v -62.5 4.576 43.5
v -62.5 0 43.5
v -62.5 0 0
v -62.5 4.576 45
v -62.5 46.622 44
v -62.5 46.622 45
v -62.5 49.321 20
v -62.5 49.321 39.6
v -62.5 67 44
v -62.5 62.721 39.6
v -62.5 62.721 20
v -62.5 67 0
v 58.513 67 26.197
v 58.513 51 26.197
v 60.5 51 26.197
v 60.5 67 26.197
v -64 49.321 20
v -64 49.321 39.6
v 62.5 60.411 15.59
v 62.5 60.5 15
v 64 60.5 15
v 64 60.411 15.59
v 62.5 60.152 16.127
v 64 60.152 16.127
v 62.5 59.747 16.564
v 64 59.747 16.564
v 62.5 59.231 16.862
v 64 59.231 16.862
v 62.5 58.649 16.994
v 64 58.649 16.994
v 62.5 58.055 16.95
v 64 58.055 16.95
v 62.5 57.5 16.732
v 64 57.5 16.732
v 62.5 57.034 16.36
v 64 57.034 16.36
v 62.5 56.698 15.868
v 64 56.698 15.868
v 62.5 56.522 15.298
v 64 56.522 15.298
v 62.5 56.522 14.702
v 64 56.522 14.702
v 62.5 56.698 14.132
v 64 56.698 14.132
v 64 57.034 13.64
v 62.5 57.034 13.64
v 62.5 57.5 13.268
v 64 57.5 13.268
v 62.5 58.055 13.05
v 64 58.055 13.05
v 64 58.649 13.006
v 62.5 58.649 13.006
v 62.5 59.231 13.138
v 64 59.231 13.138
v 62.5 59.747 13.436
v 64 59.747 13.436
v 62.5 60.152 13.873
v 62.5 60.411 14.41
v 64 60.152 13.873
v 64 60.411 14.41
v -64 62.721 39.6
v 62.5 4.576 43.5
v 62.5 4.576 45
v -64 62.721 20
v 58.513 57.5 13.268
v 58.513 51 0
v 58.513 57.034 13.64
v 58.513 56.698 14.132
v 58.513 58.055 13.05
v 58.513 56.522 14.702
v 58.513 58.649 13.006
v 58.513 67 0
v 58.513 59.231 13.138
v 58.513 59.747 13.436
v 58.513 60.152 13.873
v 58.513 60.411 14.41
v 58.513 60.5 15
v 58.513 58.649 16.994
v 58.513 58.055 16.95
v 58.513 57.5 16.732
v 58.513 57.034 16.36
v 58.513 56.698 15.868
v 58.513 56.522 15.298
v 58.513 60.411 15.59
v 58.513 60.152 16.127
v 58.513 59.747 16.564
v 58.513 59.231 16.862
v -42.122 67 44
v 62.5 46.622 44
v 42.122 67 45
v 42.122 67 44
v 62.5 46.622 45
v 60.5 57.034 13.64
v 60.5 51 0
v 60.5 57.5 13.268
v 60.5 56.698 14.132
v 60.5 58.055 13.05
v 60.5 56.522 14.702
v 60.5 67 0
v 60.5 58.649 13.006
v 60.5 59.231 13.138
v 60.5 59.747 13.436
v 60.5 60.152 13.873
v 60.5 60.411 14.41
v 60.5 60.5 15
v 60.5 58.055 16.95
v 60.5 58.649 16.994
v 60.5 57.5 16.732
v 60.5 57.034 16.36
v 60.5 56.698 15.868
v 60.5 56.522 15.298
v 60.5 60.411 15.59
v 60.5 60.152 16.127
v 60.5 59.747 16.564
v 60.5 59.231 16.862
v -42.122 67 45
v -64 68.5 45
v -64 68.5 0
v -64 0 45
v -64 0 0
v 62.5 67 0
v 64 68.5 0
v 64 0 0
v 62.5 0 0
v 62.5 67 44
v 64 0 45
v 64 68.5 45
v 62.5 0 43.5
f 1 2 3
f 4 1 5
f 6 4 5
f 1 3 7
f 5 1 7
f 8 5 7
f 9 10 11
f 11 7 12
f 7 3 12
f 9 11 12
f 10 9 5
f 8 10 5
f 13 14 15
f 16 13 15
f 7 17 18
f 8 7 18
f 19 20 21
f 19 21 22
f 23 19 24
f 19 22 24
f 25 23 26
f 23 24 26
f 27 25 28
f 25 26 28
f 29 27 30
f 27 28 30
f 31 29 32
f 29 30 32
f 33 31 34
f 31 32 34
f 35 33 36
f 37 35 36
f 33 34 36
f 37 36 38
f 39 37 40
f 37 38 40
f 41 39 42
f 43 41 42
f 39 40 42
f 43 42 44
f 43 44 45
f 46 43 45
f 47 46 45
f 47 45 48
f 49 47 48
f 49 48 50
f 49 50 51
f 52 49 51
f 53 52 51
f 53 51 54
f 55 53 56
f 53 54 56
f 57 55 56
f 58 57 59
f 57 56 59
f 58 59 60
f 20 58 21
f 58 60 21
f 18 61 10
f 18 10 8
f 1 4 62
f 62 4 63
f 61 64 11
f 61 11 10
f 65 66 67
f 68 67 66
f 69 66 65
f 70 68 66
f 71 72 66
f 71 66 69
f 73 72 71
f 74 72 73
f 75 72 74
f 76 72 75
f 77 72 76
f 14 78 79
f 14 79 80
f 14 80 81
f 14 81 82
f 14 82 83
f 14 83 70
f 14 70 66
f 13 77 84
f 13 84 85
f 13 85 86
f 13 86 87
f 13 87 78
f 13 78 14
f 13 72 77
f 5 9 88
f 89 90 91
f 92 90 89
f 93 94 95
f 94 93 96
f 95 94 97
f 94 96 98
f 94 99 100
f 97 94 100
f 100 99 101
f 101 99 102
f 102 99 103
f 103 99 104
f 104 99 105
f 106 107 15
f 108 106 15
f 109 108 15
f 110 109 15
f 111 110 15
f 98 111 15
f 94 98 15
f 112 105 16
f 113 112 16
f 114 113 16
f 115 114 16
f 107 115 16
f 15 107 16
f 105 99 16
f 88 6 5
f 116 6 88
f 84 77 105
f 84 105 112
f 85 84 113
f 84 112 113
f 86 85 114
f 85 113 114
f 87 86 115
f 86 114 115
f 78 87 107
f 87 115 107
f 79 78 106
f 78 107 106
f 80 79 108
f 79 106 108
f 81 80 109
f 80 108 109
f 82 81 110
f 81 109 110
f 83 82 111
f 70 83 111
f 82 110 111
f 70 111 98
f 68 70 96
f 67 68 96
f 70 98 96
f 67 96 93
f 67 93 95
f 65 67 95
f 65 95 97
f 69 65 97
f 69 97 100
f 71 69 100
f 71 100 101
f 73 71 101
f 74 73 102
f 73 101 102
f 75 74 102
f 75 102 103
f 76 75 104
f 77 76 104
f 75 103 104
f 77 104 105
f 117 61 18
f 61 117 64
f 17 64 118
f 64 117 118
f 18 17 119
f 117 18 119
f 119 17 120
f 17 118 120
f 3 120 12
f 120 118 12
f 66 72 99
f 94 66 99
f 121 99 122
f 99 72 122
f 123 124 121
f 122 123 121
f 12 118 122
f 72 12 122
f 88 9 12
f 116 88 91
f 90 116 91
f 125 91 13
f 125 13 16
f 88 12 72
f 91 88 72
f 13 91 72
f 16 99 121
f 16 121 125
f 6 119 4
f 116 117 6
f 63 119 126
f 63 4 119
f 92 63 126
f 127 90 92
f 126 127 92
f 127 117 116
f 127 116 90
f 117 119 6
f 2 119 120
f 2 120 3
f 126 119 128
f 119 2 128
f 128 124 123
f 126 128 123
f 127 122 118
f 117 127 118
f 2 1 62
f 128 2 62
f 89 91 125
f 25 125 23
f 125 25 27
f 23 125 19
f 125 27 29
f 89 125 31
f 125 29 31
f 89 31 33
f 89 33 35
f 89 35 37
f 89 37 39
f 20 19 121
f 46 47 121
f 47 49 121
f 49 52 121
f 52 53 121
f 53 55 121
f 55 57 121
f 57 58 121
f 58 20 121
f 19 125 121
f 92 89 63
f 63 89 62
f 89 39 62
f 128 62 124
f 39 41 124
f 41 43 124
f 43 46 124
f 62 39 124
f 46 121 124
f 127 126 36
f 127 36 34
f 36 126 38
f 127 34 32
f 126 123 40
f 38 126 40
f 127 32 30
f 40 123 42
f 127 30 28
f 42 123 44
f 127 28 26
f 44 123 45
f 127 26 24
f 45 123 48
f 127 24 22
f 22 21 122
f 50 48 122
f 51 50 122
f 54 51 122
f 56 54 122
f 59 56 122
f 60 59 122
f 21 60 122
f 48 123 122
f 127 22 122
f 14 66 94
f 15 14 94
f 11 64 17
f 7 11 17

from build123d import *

# Parameters (mm, degrees)
F1_DEPTH  = 45
F2_W      = 13.4
F2_H      = 19.6
F3_DEPTH  = 3
F5_DEPTH  = 1
F7_W      = 125.609561801
F7_H      = 4.575594794
F8_DEPTH  = 1.5
F9_W      = 1.9871633053
F9_H      = 26.1965505779
F10_DEPTH = 16
F6_R      = 2
F11_DEPTH = 9.4


with BuildPart() as f1:
    # F0 (on Top) → F1 (new body)
    with BuildSketch(Plane.XY):
        Polygon((-64, 0), (-62.5, 0), (-62.5, 67), (62.5, 67), (62.5, 0), (64, 0), (64, 68.5), (-64, 68.5), align=None)
    extrude(amount=F1_DEPTH)

    # F2 (on face) → F3 (cut, symmetric)
    with BuildSketch(Plane(origin=(-64, 0, 0), x_dir=(0, -1, 0), z_dir=(-1, 0, 0))):
        with Locations((-56.0214279117, 29.8)):
            Rectangle(F2_W, F2_H)
    extrude(amount=F3_DEPTH, both=True, mode=Mode.SUBTRACT)

    # F4 (on face) → F5 (join)
    with BuildSketch(Plane.XY.offset(45)):
        Polygon((-42.12194103, 67), (-62.5, 67), (-62.5, 46.62194103), align=None)
        Polygon((62.5, 67), (42.12194103, 67), (62.5, 46.62194103), align=None)
    extrude(amount=-F5_DEPTH)

    # F7 (on face) → F8 (join)
    with BuildSketch(Plane.XY.offset(45)):
        with Locations((0.1741200686, 2.287797397)):
            Rectangle(F7_W, F7_H)
    extrude(amount=-F8_DEPTH)

    # F9 (on face) → F10 (join)
    with BuildSketch(Plane.XZ.offset(-67)):
        with Locations((59.5064183474, 13.0982752889)):
            Rectangle(F9_W, F9_H)
    extrude(amount=F10_DEPTH)

    # F6 (on face) → F11 (cut, symmetric)
    with BuildSketch(Plane.YZ.offset(64)):
        with Locations((58.5, 15)):
            Circle(F6_R)
    extrude(amount=F11_DEPTH, both=True, mode=Mode.SUBTRACT)


solid = f1.part
